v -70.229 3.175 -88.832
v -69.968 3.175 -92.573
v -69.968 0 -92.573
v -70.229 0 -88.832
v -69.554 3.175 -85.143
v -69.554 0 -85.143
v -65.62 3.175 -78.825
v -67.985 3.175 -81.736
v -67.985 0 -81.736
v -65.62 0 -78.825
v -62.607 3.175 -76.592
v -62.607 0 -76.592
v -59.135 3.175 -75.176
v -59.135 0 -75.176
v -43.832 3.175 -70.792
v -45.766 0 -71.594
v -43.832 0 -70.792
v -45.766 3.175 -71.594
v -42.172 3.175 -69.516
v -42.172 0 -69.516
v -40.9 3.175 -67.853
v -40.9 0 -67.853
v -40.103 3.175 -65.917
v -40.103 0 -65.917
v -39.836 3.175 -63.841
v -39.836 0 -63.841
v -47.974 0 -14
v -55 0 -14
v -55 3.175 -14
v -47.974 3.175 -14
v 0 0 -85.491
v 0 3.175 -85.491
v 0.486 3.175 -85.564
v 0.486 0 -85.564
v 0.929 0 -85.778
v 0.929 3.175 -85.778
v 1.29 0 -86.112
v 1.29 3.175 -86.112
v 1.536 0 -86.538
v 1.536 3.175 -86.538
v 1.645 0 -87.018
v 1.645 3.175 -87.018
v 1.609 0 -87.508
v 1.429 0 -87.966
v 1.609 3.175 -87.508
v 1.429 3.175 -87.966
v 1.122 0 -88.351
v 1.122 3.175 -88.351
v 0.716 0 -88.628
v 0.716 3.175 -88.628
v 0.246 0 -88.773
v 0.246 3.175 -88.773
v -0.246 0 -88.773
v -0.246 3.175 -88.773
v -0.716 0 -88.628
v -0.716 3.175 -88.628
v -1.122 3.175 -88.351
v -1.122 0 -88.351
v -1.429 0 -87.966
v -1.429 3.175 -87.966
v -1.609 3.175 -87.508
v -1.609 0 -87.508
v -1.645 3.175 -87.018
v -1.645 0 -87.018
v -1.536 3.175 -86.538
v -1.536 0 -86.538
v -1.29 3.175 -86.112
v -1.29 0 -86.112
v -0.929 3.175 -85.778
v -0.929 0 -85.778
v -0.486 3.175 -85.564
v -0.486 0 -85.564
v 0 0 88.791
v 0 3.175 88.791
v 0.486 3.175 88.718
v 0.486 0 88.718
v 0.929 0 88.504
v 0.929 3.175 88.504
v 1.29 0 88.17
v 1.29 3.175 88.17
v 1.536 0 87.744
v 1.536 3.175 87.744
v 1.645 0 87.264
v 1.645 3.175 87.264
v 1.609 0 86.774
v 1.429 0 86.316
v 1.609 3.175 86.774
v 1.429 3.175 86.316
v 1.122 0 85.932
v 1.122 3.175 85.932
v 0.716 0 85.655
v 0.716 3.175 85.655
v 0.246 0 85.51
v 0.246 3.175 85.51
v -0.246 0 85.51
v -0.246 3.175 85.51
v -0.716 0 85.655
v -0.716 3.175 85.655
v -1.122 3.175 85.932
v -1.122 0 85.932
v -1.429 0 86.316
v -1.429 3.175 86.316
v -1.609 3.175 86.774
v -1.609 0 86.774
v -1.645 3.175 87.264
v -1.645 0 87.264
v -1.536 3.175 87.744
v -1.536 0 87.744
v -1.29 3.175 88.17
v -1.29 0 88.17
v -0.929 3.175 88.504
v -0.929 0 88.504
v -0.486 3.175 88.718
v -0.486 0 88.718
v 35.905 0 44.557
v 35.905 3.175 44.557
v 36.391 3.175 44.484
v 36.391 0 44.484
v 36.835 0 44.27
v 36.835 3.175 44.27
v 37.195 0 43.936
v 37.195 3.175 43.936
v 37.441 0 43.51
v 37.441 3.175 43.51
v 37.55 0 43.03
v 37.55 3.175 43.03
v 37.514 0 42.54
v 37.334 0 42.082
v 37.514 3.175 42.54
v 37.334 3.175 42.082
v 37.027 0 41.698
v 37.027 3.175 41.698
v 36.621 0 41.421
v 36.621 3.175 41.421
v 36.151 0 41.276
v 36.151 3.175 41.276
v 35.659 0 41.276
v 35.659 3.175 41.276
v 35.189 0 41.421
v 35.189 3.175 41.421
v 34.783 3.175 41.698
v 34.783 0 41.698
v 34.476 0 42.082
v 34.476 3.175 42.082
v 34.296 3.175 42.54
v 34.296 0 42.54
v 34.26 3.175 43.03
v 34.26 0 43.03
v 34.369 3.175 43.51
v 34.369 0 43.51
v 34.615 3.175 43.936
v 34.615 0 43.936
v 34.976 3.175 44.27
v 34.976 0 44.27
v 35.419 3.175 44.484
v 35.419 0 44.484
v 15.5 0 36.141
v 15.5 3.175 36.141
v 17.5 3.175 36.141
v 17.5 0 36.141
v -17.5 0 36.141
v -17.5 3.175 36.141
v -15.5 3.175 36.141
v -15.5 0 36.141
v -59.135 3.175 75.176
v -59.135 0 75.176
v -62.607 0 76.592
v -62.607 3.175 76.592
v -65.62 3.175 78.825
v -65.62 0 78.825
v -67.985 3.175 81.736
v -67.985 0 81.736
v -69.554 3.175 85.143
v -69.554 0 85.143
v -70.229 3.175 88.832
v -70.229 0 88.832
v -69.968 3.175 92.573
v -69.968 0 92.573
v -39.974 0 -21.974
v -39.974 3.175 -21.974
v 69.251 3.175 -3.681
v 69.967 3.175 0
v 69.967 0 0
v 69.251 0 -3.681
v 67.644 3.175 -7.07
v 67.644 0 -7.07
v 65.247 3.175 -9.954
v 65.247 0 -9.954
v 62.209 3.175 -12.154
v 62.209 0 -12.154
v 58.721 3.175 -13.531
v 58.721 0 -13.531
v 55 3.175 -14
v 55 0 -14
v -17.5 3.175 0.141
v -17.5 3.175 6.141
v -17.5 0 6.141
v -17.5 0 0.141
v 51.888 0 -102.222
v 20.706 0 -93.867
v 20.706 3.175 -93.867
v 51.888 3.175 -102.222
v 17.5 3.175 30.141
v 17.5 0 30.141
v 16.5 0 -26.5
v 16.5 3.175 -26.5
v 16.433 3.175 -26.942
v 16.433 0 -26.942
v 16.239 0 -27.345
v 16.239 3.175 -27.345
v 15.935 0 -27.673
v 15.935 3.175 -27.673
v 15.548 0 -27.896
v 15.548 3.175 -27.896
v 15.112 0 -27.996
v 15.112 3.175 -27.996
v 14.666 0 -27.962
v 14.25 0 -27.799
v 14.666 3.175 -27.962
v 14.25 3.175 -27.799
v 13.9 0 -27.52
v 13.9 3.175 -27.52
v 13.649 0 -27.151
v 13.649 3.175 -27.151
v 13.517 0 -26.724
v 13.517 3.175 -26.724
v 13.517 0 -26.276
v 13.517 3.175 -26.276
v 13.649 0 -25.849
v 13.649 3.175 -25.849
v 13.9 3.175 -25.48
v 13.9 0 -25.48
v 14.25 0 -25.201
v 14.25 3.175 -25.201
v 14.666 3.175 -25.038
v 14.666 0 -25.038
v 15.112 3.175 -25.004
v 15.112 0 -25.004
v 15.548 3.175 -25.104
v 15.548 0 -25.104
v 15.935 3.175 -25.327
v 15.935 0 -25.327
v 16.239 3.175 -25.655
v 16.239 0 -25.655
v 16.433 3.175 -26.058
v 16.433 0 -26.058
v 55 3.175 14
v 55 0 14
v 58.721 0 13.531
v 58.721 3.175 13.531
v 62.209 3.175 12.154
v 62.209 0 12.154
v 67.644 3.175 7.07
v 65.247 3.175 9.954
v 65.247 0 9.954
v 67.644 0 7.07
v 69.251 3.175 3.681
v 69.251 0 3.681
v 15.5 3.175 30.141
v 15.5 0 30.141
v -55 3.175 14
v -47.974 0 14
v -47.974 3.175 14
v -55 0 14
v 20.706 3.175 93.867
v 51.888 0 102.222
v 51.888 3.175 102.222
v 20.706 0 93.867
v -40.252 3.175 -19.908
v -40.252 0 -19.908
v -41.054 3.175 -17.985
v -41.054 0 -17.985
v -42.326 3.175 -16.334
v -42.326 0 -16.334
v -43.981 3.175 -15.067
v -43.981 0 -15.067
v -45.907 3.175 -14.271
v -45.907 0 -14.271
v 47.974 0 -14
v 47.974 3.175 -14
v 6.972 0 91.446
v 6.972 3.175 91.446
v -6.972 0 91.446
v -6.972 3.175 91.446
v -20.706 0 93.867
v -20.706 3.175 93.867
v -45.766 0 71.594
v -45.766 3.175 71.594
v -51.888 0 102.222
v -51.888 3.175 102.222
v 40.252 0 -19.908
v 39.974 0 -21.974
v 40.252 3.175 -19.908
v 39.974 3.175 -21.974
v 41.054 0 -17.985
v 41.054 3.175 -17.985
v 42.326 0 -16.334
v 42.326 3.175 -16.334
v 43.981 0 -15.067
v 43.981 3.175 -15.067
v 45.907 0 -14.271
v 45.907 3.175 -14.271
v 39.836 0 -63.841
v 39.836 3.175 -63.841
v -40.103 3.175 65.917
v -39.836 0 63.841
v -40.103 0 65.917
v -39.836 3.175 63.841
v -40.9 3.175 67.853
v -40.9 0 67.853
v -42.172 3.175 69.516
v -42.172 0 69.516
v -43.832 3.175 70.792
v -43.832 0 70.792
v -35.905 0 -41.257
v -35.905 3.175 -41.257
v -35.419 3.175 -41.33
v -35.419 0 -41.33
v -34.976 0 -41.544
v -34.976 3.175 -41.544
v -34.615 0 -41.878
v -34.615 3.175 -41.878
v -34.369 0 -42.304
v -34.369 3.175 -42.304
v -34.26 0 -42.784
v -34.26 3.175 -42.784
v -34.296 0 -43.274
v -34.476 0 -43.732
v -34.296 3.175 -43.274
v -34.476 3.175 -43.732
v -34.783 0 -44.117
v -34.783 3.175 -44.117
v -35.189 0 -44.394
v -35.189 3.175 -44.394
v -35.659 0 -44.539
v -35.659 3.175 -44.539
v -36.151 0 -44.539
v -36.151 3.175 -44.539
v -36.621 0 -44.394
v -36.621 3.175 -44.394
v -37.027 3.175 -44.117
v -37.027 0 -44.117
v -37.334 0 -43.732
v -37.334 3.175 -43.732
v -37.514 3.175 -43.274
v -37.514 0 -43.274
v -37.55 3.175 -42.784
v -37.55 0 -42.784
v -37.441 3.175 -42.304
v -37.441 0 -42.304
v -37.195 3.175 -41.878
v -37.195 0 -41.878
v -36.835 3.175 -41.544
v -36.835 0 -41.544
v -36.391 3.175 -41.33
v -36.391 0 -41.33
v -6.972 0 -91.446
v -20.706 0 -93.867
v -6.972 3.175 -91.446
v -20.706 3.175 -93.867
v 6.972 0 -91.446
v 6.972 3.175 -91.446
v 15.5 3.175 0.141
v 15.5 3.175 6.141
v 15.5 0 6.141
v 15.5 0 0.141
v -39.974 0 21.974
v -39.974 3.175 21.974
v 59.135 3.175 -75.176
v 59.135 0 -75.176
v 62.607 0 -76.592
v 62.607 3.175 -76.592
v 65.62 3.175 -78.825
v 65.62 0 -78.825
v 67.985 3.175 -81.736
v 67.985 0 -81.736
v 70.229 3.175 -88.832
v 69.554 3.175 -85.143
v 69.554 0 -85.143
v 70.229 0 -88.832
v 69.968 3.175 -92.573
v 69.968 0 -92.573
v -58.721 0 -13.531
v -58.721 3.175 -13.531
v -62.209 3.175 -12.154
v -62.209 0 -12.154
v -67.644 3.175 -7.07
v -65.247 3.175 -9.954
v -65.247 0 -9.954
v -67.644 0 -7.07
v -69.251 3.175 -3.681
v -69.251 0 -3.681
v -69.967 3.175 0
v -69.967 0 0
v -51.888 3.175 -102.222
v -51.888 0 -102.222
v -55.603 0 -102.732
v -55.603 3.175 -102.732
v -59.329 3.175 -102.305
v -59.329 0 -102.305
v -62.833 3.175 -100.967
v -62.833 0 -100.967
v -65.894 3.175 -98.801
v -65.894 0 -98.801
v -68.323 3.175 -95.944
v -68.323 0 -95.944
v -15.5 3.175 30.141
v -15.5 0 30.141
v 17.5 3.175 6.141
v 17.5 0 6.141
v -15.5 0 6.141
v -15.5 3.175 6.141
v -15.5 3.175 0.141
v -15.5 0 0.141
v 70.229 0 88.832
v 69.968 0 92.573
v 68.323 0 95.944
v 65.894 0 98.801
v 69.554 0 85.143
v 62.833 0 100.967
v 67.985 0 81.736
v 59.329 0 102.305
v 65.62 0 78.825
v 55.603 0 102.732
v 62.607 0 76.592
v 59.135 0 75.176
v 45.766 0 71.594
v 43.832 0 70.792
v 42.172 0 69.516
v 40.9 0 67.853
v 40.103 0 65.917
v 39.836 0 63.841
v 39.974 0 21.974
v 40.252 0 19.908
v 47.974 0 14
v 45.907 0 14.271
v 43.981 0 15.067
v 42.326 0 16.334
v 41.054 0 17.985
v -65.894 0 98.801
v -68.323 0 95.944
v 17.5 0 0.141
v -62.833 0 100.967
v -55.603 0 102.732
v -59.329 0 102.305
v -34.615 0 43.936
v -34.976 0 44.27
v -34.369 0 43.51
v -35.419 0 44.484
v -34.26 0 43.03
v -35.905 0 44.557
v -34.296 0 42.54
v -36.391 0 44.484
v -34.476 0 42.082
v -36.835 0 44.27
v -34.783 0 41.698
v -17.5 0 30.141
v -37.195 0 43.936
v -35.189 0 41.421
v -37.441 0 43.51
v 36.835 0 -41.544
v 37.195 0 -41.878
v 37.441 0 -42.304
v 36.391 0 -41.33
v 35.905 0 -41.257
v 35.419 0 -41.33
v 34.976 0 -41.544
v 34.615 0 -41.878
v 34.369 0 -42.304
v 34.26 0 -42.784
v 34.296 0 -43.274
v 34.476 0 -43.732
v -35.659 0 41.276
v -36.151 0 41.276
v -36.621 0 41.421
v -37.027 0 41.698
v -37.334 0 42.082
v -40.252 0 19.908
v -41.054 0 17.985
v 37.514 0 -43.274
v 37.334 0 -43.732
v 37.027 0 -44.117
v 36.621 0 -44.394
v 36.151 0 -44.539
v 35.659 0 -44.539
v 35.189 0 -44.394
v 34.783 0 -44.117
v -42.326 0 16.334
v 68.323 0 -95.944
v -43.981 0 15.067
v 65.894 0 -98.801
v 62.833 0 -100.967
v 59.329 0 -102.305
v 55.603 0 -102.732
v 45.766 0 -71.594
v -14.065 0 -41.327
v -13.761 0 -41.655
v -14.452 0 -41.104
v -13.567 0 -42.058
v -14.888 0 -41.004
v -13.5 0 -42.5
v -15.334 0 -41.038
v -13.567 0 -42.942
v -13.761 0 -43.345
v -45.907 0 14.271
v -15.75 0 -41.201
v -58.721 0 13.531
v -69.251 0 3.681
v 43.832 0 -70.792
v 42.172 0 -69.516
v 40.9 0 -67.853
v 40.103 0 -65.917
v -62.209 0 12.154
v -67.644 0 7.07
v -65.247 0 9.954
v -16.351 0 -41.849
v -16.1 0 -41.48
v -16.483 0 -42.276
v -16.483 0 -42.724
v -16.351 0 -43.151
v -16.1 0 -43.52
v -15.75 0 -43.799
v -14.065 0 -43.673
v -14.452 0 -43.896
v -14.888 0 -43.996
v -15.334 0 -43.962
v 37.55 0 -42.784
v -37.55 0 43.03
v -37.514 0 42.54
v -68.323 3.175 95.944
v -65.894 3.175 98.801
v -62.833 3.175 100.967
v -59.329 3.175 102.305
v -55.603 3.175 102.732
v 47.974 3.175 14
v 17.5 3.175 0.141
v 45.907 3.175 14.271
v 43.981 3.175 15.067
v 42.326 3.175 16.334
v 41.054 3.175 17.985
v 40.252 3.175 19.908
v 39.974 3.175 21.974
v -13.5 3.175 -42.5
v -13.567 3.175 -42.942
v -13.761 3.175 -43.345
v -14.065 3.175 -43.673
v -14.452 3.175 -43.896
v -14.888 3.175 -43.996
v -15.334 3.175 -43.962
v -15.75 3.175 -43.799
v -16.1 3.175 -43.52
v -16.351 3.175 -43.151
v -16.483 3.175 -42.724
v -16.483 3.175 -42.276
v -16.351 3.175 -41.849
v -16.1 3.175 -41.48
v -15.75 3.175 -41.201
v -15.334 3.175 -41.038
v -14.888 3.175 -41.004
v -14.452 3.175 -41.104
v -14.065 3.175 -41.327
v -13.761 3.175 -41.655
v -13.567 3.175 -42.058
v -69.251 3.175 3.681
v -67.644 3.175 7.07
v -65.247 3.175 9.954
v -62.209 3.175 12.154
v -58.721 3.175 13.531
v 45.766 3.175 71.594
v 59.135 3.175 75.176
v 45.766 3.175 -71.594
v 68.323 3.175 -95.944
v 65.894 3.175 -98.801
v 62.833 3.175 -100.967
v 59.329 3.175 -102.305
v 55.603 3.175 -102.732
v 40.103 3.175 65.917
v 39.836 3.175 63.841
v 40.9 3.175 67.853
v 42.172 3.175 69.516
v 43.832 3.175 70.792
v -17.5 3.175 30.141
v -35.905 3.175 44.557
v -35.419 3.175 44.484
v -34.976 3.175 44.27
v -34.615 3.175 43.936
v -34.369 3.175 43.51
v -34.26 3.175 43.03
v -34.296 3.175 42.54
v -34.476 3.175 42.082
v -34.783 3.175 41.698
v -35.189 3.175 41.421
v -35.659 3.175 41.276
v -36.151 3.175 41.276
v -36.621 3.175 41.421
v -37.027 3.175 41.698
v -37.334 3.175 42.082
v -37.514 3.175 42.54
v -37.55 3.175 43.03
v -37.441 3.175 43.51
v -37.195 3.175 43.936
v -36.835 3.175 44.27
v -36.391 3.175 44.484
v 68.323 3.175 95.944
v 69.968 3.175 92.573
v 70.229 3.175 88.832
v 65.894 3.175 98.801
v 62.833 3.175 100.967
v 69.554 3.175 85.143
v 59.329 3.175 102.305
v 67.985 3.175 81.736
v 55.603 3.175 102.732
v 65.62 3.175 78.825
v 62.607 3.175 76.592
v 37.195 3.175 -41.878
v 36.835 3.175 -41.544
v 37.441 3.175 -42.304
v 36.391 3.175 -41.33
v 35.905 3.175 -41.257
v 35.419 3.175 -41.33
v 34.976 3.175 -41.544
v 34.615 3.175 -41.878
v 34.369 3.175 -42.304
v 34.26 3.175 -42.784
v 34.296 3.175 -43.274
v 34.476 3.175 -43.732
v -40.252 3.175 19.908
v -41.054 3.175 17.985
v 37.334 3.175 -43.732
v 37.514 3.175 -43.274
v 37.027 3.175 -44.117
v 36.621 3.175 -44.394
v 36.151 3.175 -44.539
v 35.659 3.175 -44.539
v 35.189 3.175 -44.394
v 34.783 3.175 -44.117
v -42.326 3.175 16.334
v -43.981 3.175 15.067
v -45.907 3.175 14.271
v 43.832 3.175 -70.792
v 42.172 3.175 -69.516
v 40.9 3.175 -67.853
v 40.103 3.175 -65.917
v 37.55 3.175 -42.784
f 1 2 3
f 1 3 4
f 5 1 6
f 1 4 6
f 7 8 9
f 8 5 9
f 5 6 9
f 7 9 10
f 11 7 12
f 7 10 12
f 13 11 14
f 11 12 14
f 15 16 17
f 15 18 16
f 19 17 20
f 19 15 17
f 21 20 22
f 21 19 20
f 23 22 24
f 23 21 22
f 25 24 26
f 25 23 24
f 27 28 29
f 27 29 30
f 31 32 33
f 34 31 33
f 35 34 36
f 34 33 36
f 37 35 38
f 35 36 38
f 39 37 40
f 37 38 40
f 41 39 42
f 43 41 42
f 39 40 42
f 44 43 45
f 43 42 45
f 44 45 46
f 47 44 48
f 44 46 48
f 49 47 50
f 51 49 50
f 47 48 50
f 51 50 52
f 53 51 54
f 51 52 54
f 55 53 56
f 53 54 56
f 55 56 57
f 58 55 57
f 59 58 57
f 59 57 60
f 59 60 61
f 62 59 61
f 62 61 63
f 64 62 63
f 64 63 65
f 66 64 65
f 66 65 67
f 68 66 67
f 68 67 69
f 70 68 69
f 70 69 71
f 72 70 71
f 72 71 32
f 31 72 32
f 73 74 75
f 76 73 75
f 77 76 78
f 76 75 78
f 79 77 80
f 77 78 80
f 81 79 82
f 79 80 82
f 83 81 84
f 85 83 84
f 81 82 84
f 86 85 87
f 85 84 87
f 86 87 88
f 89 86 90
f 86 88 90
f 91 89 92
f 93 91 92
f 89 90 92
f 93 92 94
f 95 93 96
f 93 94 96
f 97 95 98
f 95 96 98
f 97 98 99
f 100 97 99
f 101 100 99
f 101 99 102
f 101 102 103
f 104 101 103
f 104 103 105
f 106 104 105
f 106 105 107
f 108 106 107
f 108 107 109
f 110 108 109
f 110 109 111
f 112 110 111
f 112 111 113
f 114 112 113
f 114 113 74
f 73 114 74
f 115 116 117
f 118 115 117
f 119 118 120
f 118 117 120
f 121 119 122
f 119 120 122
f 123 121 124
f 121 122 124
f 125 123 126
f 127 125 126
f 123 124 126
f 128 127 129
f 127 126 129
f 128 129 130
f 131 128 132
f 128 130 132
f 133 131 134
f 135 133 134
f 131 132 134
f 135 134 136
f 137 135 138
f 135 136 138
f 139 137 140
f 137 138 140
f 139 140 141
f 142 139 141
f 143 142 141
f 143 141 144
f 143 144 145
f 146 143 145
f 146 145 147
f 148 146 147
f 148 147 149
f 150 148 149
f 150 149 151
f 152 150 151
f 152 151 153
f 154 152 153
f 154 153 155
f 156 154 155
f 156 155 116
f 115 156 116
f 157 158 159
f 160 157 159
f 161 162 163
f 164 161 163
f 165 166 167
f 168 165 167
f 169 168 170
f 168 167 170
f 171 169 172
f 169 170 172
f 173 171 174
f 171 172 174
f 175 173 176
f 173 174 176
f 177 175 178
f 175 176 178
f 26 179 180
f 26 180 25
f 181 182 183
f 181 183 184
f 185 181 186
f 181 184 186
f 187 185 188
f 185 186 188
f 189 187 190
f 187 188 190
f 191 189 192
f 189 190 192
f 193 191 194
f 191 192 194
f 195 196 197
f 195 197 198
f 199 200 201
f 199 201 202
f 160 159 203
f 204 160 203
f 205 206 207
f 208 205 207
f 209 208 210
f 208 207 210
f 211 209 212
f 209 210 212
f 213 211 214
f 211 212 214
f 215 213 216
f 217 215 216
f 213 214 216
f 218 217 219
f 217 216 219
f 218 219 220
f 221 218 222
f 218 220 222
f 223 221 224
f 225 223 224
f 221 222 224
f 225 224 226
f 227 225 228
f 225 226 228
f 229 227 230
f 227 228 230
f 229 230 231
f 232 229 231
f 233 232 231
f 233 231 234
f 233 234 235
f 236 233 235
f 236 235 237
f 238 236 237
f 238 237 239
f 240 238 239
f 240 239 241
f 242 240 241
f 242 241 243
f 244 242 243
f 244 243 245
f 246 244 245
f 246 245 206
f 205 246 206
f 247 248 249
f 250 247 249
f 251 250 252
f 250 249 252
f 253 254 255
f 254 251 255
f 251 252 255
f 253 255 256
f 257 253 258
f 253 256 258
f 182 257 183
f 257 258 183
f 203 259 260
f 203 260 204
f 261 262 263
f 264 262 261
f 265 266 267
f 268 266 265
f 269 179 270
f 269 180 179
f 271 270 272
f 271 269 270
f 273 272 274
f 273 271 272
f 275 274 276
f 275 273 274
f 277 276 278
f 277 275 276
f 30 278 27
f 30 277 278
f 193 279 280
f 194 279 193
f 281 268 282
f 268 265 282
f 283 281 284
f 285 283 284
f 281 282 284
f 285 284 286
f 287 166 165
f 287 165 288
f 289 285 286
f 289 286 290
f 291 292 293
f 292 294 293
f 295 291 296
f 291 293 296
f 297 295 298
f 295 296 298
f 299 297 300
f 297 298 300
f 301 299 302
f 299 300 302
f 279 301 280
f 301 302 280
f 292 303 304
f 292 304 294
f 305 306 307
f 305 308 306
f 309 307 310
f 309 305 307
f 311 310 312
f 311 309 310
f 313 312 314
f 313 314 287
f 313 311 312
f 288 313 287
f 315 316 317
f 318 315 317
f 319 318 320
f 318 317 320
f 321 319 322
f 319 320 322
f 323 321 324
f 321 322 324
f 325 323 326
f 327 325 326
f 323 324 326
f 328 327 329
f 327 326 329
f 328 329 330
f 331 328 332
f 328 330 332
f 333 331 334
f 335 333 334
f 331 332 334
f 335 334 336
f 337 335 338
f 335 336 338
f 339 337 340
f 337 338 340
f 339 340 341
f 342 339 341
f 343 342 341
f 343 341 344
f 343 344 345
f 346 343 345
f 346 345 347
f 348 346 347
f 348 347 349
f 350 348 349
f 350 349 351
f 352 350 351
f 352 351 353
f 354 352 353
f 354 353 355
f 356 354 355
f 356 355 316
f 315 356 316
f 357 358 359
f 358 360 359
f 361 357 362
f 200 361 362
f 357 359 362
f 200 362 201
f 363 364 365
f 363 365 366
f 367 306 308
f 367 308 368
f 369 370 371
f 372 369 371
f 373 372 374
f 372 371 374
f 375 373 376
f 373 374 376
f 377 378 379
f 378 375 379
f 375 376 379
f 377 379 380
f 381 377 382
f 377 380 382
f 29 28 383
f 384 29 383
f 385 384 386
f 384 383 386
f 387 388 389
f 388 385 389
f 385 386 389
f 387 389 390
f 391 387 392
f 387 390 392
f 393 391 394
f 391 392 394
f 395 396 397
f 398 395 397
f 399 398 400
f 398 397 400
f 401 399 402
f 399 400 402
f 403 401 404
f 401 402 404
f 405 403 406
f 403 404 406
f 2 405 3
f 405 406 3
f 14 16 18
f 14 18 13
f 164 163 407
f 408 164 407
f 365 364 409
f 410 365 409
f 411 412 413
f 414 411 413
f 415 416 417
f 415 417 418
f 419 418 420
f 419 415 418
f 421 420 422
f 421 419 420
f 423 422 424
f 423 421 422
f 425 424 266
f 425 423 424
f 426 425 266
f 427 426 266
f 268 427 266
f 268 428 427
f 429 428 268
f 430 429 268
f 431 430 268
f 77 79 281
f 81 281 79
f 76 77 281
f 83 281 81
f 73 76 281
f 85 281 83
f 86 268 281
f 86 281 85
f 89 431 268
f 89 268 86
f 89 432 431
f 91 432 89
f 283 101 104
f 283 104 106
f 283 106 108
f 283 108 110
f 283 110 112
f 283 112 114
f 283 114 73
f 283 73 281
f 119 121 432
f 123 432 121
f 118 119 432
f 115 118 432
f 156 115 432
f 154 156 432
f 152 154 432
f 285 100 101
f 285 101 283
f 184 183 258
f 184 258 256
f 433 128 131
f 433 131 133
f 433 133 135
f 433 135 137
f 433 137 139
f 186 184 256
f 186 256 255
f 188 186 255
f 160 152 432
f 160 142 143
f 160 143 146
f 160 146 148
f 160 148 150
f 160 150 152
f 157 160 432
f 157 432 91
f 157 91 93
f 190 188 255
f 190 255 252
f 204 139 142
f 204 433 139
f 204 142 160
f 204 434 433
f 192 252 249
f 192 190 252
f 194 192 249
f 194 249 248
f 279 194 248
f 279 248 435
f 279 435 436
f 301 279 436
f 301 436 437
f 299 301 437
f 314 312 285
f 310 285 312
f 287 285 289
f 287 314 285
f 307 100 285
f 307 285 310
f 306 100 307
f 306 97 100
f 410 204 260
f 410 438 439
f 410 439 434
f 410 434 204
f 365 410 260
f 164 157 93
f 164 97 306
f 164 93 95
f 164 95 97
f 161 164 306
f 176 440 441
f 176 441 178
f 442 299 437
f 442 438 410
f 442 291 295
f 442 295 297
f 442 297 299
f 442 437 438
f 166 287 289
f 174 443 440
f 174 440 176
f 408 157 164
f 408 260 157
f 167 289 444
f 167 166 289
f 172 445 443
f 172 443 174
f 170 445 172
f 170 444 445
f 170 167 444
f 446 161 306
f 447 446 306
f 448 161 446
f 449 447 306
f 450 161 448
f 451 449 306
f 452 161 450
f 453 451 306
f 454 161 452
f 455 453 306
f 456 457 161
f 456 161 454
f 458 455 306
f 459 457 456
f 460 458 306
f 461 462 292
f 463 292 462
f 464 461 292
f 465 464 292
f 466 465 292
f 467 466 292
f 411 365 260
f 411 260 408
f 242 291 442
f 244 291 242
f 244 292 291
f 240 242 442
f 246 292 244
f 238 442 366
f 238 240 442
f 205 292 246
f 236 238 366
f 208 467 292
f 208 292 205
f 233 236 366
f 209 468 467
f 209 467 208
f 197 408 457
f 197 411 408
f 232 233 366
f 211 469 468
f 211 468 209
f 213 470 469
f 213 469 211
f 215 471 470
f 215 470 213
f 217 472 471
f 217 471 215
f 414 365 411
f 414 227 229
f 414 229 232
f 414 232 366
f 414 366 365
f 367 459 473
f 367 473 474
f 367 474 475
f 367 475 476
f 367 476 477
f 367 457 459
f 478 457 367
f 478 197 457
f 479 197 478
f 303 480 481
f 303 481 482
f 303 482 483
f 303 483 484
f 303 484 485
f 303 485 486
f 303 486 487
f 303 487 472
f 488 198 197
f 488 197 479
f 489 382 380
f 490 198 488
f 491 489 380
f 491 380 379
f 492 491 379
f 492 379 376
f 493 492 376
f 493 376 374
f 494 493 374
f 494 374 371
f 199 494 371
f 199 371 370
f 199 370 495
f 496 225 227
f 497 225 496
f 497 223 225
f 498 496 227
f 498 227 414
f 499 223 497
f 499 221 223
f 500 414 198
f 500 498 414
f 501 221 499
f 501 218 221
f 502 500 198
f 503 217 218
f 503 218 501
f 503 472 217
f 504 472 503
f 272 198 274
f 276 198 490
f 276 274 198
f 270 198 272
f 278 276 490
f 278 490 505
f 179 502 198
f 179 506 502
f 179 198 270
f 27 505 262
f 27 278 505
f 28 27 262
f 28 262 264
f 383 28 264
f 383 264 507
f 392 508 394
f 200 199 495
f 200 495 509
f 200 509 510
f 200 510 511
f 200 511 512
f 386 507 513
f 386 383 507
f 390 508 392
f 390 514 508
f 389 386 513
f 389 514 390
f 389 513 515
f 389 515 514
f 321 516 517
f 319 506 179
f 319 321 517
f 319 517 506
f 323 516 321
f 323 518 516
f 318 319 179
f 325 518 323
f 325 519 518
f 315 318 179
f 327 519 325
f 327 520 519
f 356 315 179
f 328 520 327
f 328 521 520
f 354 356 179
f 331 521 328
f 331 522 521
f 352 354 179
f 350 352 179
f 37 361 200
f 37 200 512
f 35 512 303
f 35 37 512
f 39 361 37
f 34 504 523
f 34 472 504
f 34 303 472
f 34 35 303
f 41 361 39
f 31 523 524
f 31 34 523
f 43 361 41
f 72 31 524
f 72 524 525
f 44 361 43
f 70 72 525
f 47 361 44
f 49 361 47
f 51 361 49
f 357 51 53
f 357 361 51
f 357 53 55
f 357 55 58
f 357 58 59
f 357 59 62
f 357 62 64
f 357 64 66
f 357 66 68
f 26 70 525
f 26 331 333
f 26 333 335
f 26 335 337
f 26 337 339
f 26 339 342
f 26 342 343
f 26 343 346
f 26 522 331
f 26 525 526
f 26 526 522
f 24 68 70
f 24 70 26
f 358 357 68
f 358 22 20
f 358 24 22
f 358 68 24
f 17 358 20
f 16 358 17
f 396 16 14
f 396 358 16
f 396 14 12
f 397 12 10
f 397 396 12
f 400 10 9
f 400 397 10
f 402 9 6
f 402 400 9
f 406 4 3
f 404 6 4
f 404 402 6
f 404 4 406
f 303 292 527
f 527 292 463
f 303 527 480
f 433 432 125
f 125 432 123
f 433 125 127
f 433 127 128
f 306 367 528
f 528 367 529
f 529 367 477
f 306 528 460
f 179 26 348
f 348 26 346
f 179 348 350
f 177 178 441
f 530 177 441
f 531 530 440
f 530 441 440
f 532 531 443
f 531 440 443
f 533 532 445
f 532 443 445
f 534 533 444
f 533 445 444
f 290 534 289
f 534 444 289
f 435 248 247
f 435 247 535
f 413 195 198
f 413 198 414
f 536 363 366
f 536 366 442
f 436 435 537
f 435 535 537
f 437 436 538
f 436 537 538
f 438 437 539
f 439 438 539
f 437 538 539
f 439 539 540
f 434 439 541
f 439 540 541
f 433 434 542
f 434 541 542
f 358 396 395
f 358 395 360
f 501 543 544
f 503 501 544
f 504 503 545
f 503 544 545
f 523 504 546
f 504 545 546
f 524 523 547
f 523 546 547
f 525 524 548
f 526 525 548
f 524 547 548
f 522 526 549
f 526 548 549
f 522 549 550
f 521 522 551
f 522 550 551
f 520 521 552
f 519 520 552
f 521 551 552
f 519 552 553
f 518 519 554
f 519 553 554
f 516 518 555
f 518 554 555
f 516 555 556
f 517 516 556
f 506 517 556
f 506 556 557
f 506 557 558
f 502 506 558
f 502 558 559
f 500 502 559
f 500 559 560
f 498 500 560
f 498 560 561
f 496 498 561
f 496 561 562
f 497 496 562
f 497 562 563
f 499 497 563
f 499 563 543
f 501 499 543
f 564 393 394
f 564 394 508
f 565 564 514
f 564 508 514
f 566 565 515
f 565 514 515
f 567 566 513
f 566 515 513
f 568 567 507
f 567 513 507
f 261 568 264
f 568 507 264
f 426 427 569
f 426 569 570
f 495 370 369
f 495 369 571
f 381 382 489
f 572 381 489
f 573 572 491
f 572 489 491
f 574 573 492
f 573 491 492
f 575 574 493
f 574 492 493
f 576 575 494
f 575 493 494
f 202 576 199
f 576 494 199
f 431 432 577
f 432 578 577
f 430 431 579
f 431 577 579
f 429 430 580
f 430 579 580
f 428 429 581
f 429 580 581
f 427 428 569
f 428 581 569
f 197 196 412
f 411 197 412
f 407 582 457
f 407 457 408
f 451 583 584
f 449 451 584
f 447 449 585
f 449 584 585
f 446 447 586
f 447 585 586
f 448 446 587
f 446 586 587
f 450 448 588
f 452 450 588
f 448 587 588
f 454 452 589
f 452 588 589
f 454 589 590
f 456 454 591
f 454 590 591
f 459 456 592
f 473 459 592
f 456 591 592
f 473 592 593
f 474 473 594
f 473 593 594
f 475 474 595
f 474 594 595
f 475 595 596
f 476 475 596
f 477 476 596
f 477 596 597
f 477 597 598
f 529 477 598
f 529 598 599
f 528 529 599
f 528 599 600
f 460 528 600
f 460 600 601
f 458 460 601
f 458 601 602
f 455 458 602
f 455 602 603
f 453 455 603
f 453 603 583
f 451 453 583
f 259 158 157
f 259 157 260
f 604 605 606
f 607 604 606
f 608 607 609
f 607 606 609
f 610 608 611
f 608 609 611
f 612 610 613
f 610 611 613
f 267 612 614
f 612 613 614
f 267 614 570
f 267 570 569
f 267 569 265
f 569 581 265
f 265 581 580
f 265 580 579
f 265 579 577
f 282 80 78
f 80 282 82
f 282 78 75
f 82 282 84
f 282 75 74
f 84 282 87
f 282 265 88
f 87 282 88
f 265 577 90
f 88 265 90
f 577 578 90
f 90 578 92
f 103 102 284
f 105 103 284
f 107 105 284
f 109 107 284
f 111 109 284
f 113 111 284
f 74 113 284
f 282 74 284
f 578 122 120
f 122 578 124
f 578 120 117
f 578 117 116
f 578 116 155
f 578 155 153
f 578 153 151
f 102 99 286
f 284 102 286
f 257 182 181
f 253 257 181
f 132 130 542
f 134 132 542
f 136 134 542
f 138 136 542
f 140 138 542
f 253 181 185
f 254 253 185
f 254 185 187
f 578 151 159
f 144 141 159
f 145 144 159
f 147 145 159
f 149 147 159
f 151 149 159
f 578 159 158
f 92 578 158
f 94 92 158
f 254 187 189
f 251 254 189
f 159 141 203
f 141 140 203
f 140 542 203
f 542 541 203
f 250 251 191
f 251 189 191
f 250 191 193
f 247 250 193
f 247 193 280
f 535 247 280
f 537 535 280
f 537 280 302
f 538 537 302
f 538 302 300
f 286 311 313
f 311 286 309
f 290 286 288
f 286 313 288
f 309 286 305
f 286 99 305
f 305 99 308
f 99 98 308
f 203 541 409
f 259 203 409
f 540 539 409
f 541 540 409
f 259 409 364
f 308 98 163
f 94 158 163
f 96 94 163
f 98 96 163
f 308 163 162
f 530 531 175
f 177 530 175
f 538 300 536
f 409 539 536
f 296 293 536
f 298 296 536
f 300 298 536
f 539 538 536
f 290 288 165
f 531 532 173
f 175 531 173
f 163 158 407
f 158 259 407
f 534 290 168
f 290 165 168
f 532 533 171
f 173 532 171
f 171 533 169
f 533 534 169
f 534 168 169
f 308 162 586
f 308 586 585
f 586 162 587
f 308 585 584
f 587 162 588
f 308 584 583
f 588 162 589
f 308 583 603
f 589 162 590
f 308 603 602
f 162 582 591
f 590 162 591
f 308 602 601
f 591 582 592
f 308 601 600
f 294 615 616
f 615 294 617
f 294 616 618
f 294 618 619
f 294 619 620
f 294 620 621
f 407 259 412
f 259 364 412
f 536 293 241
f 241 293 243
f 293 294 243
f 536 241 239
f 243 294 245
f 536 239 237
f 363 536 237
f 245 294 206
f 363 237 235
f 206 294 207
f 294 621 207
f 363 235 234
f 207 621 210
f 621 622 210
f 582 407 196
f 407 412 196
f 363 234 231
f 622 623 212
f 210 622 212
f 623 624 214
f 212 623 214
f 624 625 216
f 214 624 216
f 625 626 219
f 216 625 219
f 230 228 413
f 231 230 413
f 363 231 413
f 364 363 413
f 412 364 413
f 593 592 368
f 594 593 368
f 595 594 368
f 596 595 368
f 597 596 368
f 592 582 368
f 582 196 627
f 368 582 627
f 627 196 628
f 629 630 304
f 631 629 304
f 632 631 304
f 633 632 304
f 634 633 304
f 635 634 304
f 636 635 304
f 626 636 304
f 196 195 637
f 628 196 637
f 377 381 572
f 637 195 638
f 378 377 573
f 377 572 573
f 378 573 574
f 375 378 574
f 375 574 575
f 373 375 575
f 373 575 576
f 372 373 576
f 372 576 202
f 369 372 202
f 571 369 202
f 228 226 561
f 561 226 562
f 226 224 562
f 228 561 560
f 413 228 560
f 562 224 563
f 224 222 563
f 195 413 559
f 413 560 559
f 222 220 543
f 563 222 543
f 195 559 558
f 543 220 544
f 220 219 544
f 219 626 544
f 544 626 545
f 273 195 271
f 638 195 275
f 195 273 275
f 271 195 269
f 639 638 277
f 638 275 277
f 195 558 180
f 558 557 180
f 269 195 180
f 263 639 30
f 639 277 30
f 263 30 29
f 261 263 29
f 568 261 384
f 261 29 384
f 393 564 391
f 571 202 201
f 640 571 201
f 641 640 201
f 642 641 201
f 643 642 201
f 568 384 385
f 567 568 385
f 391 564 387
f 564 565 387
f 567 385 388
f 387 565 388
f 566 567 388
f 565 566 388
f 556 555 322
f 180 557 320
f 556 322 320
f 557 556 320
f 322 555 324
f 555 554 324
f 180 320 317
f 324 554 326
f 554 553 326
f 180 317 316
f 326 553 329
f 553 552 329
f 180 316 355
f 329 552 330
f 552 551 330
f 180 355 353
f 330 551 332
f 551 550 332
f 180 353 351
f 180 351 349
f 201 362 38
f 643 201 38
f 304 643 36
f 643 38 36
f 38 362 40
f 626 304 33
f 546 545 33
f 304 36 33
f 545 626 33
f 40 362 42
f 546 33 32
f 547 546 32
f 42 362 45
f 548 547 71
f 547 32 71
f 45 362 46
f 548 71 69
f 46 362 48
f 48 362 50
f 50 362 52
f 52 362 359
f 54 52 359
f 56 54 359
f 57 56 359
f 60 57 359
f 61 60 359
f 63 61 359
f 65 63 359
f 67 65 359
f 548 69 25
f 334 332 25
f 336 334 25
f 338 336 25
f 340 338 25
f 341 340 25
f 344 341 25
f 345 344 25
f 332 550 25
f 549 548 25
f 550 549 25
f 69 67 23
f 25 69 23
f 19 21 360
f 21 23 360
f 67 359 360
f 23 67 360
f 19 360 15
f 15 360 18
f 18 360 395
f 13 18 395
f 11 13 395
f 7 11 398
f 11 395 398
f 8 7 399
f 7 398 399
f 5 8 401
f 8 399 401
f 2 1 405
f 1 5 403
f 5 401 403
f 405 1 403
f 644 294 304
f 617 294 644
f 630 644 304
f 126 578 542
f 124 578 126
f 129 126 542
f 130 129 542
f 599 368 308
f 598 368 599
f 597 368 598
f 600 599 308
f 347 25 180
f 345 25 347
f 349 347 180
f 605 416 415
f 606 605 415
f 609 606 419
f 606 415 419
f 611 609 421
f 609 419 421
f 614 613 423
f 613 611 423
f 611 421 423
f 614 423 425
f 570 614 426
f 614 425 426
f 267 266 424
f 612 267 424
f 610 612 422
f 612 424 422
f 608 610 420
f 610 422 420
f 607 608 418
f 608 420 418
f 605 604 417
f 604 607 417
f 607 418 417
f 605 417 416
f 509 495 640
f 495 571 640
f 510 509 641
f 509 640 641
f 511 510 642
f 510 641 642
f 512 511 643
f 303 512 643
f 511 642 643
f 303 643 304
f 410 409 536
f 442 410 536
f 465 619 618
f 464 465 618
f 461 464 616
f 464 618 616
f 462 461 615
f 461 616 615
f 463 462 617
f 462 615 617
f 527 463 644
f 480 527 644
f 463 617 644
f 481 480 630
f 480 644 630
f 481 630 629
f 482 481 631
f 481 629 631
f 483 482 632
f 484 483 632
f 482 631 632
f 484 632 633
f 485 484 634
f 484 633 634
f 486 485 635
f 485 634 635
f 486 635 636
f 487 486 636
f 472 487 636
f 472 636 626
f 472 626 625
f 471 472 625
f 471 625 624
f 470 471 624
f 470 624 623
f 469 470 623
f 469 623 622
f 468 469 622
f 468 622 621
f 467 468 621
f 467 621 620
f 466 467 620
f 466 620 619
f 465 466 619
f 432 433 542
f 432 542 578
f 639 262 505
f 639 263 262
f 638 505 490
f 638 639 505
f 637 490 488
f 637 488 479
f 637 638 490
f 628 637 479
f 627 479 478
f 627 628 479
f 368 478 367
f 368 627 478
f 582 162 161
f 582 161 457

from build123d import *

# Parameters (mm, degrees)
BOSS_EXTRUDE1_DEPTH = 3.175
FILLET1_R           = 80
FILLET2_R           = 8
SKETCH2_R           = 1.65
CUT_EXTRUDE1_DEPTH  = 10
CUT_EXTRUDE2_DEPTH  = 10
SKETCH4_W           = 2
SKETCH4_H           = 6
CUT_EXTRUDE3_DEPTH  = 10
CUT_EXTRUDE4_START  = -10
CUT_EXTRUDE4_DEPTH  = 10
FILLET3_R           = 15


with BuildPart() as part:
    # Sketch1 → Boss-Extrude1 (new body)
    with BuildSketch(Plane(origin=(0, 0, 0), x_dir=(1, 0, 0), z_dir=(0, 1, 0))):
        with BuildLine():
            Line((-70, 14), (-40, 14))
            Line((-40, 14), (-39.816062711, 70))
            Line((-39.816062711, 70), (-73.623466631, 79.058666579))
            ThreePointArc((-73.623466631, 79.058666579), (-83.522961568, 96.205094778), (-66.376533369, 106.104589715))
            Line((-66.376533369, 106.104589715), (0, 88.319051202))
            Line((0, 88.319051202), (66.376533369, 106.104589715))
            ThreePointArc((66.376533369, 106.104589715), (83.522961568, 96.205094778), (73.623466631, 79.058666579))
            Line((73.623466631, 79.058666579), (39.816062711, 70))
            Line((39.816062711, 70), (40, 14))
            Line((40, 14), (70, 14))
            ThreePointArc((70, 14), (84, 0), (70, -14))
            Line((70, -14), (40, -14))
            Line((40, -14), (39.816062711, -70))
            Line((39.816062711, -70), (73.623466631, -79.058666579))
            ThreePointArc((73.623466631, -79.058666579), (83.522961568, -96.205094778), (66.376533369, -106.104589715))
            Line((66.376533369, -106.104589715), (0, -88.319051202))
            Line((0, -88.319051202), (-66.376533369, -106.104589715))
            ThreePointArc((-66.376533369, -106.104589715), (-83.522961568, -96.205094778), (-73.623466631, -79.058666579))
            Line((-73.623466631, -79.058666579), (-39.816062711, -70))
            Line((-39.816062711, -70), (-40, -14))
            Line((-40, -14), (-70, -14))
            ThreePointArc((-70, -14), (-84, 0), (-70, 14))
        make_face()
    extrude(amount=BOSS_EXTRUDE1_DEPTH)

    # Fillet1
    fillet1_edges = [part.edges().sort_by_distance(p)[0] for p in [
        (0, 1.5875, -88.319051202),
        (0, 1.5875, 88.319051202),
    ]]
    fillet(fillet1_edges, radius=FILLET1_R)

    # Fillet2
    fillet2_edges = [part.edges().sort_by_distance(p)[0] for p in [
        (-40, 1.5875, -14),
        (-39.816062711, 1.5875, -70),
        (39.816062711, 1.5875, -70),
        (40, 1.5875, -14),
        (40, 1.5875, 14),
        (39.816062711, 1.5875, 70),
        (-39.816062711, 1.5875, 70),
        (-40, 1.5875, 14),
    ]]
    fillet(fillet2_edges, radius=FILLET2_R)

    # Sketch2 → Cut-Extrude1 (cut)
    with BuildSketch(Plane(origin=(0, 3.175, 0), x_dir=(1, 0, 0), z_dir=(0, 1, 0))):
        with Locations(Location((0, 87.141145635, 0), (0, 0, 270))):
            Circle(SKETCH2_R)
        with Locations(Location((-35.905030257, 42.907120147, 0), (0, 0, 270))):
            Circle(SKETCH2_R)
        with Locations(Location((35.905030257, 42.907120147, 0), (0, 0, 270))):
            Circle(SKETCH2_R)
        with Locations(Location((35.905030257, -42.907120147, 0), (0, 0, 270))):
            Circle(SKETCH2_R)
        with Locations(Location((0, -87.141145635, 0), (0, 0, 270))):
            Circle(SKETCH2_R)
        with Locations(Location((-35.905030257, -42.907120147, 0), (0, 0, 270))):
            Circle(SKETCH2_R)
    extrude(amount=-CUT_EXTRUDE1_DEPTH, mode=Mode.SUBTRACT)

    # Sketch3 → Cut-Extrude2 (cut)
    with BuildSketch(Plane(origin=(0, 3.175, 0), x_dir=(1, 0, 0), z_dir=(0, 1, 0))):
        with BuildLine():
            ThreePointArc((13.5, 26.5), (15, 25), (16.5, 26.5))
            ThreePointArc((16.5, 26.5), (15, 28), (13.5, 26.5))
        make_face()
        with BuildLine():
            ThreePointArc((-16.5, 42.5), (-15, 41), (-13.5, 42.5))
            ThreePointArc((-13.5, 42.5), (-15, 44), (-16.5, 42.5))
        make_face()
    extrude(amount=-CUT_EXTRUDE2_DEPTH, mode=Mode.SUBTRACT)

    # Sketch4 → Cut-Extrude3 (cut)
    with BuildSketch(Plane(origin=(0, 3.175, 0), x_dir=(1, 0, 0), z_dir=(0, 1, 0))):
        with Locations((-16.5, -33.141145635)):
            Rectangle(SKETCH4_W, SKETCH4_H)
        with Locations((16.5, -3.141145635)):
            Rectangle(SKETCH4_W, SKETCH4_H)
        with Locations((16.5, -33.141145635)):
            Rectangle(SKETCH4_W, SKETCH4_H)
        with Locations((-16.5, -3.141145635)):
            Rectangle(SKETCH4_W, SKETCH4_H)
    extrude(amount=-CUT_EXTRUDE3_DEPTH, mode=Mode.SUBTRACT)

    # Sketch5 → Cut-Extrude4 (cut)
    with BuildSketch(Plane(origin=(0, 3.175, 0), x_dir=(1, 0, 0), z_dir=(0, 1, 0)).offset(CUT_EXTRUDE4_START)):
        with BuildLine():
            Line((-73.623466631, 79.058666579), (-66.376533369, 106.104589715))
            ThreePointArc((-66.376533369, 106.104589715), (-83.522961568, 96.205094778), (-73.623466631, 79.058666579))
        make_face()
        with BuildLine():
            Line((73.623466631, 79.058666579), (66.376533369, 106.104589715))
            ThreePointArc((66.376533369, 106.104589715), (83.522961568, 96.205094778), (73.623466631, 79.058666579))
        make_face()
        with BuildLine():
            Line((73.623466631, -79.058666579), (66.376533369, -106.104589715))
            ThreePointArc((66.376533369, -106.104589715), (83.522961568, -96.205094778), (73.623466631, -79.058666579))
        make_face()
        with BuildLine():
            Line((-73.623466631, -79.058666579), (-66.376533369, -106.104589715))
            ThreePointArc((-66.376533369, -106.104589715), (-83.522961568, -96.205094778), (-73.623466631, -79.058666579))
        make_face()
        with BuildLine():
            Line((-70, 14), (-70, -14))
            ThreePointArc((-70, -14), (-84, 0), (-70, 14))
        make_face()
        with BuildLine():
            Line((70, 14), (70, -14))
            ThreePointArc((70, -14), (84, 0), (70, 14))
        make_face()
    extrude(amount=CUT_EXTRUDE4_DEPTH, mode=Mode.SUBTRACT)

    # Fillet3
    # the kernel refuses this fillet: 15 mm, written as the material it takes off along each edge
    with BuildSketch(Plane(origin=(66.376533369, -37.5, -106.104589715), x_dir=(0.25881904510251735, 0, 0.9659258262890692), z_dir=(0, 1, 0)), Plane(origin=(73.623466631, -37.5, -79.058666579), x_dir=(-0.9659258262890694, 0, 0.2588190451025162), z_dir=(0, 1, 0)), Plane(origin=(70, -37.5, -14), x_dir=(0, 0, 1), z_dir=(0, 1, 0)), Plane(origin=(70, -37.5, 14), x_dir=(-1, 0, 0), z_dir=(0, 1, 0)), Plane(origin=(73.623466631, -37.5, 79.058666579), x_dir=(-0.2588190451025152, 0, 0.9659258262890699), z_dir=(0, 1, 0)), Plane(origin=(66.376533369, -37.5, 106.104589715), x_dir=(-0.9659258262890692, 0, -0.2588190451025171), z_dir=(0, 1, 0)), Plane(origin=(-66.376533369, -37.5, 106.104589715), x_dir=(-0.25881904510251846, 0, -0.965925826289069), z_dir=(0, 1, 0)), Plane(origin=(-73.623466631, -37.5, 79.058666579), x_dir=(0.9659258262890696, 0, -0.25881904510251585), z_dir=(0, 1, 0)), Plane(origin=(-70, -37.5, 14), x_dir=(0, 0, -1), z_dir=(0, 1, 0)), Plane(origin=(-70, -37.5, -14), x_dir=(1, 0, 0), z_dir=(0, 1, 0)), Plane(origin=(-73.623466631, -37.5, -79.058666579), x_dir=(0.2588190451025171, 0, -0.9659258262890692), z_dir=(0, 1, 0)), Plane(origin=(-66.376533369, -37.5, -106.104589715), x_dir=(0.9659258262890688, 0, 0.2588190451025186), z_dir=(0, 1, 0))) as fillet3_piece_1:
        with BuildLine():
            CenterArc((FILLET3_R, -FILLET3_R), FILLET3_R, 90, 90)
            Line((0, -FILLET3_R), (0, 0))
            Line((0, 0), (FILLET3_R, 0))
        make_face()
    extrude(amount=78.175, mode=Mode.SUBTRACT)


solid = part.part
